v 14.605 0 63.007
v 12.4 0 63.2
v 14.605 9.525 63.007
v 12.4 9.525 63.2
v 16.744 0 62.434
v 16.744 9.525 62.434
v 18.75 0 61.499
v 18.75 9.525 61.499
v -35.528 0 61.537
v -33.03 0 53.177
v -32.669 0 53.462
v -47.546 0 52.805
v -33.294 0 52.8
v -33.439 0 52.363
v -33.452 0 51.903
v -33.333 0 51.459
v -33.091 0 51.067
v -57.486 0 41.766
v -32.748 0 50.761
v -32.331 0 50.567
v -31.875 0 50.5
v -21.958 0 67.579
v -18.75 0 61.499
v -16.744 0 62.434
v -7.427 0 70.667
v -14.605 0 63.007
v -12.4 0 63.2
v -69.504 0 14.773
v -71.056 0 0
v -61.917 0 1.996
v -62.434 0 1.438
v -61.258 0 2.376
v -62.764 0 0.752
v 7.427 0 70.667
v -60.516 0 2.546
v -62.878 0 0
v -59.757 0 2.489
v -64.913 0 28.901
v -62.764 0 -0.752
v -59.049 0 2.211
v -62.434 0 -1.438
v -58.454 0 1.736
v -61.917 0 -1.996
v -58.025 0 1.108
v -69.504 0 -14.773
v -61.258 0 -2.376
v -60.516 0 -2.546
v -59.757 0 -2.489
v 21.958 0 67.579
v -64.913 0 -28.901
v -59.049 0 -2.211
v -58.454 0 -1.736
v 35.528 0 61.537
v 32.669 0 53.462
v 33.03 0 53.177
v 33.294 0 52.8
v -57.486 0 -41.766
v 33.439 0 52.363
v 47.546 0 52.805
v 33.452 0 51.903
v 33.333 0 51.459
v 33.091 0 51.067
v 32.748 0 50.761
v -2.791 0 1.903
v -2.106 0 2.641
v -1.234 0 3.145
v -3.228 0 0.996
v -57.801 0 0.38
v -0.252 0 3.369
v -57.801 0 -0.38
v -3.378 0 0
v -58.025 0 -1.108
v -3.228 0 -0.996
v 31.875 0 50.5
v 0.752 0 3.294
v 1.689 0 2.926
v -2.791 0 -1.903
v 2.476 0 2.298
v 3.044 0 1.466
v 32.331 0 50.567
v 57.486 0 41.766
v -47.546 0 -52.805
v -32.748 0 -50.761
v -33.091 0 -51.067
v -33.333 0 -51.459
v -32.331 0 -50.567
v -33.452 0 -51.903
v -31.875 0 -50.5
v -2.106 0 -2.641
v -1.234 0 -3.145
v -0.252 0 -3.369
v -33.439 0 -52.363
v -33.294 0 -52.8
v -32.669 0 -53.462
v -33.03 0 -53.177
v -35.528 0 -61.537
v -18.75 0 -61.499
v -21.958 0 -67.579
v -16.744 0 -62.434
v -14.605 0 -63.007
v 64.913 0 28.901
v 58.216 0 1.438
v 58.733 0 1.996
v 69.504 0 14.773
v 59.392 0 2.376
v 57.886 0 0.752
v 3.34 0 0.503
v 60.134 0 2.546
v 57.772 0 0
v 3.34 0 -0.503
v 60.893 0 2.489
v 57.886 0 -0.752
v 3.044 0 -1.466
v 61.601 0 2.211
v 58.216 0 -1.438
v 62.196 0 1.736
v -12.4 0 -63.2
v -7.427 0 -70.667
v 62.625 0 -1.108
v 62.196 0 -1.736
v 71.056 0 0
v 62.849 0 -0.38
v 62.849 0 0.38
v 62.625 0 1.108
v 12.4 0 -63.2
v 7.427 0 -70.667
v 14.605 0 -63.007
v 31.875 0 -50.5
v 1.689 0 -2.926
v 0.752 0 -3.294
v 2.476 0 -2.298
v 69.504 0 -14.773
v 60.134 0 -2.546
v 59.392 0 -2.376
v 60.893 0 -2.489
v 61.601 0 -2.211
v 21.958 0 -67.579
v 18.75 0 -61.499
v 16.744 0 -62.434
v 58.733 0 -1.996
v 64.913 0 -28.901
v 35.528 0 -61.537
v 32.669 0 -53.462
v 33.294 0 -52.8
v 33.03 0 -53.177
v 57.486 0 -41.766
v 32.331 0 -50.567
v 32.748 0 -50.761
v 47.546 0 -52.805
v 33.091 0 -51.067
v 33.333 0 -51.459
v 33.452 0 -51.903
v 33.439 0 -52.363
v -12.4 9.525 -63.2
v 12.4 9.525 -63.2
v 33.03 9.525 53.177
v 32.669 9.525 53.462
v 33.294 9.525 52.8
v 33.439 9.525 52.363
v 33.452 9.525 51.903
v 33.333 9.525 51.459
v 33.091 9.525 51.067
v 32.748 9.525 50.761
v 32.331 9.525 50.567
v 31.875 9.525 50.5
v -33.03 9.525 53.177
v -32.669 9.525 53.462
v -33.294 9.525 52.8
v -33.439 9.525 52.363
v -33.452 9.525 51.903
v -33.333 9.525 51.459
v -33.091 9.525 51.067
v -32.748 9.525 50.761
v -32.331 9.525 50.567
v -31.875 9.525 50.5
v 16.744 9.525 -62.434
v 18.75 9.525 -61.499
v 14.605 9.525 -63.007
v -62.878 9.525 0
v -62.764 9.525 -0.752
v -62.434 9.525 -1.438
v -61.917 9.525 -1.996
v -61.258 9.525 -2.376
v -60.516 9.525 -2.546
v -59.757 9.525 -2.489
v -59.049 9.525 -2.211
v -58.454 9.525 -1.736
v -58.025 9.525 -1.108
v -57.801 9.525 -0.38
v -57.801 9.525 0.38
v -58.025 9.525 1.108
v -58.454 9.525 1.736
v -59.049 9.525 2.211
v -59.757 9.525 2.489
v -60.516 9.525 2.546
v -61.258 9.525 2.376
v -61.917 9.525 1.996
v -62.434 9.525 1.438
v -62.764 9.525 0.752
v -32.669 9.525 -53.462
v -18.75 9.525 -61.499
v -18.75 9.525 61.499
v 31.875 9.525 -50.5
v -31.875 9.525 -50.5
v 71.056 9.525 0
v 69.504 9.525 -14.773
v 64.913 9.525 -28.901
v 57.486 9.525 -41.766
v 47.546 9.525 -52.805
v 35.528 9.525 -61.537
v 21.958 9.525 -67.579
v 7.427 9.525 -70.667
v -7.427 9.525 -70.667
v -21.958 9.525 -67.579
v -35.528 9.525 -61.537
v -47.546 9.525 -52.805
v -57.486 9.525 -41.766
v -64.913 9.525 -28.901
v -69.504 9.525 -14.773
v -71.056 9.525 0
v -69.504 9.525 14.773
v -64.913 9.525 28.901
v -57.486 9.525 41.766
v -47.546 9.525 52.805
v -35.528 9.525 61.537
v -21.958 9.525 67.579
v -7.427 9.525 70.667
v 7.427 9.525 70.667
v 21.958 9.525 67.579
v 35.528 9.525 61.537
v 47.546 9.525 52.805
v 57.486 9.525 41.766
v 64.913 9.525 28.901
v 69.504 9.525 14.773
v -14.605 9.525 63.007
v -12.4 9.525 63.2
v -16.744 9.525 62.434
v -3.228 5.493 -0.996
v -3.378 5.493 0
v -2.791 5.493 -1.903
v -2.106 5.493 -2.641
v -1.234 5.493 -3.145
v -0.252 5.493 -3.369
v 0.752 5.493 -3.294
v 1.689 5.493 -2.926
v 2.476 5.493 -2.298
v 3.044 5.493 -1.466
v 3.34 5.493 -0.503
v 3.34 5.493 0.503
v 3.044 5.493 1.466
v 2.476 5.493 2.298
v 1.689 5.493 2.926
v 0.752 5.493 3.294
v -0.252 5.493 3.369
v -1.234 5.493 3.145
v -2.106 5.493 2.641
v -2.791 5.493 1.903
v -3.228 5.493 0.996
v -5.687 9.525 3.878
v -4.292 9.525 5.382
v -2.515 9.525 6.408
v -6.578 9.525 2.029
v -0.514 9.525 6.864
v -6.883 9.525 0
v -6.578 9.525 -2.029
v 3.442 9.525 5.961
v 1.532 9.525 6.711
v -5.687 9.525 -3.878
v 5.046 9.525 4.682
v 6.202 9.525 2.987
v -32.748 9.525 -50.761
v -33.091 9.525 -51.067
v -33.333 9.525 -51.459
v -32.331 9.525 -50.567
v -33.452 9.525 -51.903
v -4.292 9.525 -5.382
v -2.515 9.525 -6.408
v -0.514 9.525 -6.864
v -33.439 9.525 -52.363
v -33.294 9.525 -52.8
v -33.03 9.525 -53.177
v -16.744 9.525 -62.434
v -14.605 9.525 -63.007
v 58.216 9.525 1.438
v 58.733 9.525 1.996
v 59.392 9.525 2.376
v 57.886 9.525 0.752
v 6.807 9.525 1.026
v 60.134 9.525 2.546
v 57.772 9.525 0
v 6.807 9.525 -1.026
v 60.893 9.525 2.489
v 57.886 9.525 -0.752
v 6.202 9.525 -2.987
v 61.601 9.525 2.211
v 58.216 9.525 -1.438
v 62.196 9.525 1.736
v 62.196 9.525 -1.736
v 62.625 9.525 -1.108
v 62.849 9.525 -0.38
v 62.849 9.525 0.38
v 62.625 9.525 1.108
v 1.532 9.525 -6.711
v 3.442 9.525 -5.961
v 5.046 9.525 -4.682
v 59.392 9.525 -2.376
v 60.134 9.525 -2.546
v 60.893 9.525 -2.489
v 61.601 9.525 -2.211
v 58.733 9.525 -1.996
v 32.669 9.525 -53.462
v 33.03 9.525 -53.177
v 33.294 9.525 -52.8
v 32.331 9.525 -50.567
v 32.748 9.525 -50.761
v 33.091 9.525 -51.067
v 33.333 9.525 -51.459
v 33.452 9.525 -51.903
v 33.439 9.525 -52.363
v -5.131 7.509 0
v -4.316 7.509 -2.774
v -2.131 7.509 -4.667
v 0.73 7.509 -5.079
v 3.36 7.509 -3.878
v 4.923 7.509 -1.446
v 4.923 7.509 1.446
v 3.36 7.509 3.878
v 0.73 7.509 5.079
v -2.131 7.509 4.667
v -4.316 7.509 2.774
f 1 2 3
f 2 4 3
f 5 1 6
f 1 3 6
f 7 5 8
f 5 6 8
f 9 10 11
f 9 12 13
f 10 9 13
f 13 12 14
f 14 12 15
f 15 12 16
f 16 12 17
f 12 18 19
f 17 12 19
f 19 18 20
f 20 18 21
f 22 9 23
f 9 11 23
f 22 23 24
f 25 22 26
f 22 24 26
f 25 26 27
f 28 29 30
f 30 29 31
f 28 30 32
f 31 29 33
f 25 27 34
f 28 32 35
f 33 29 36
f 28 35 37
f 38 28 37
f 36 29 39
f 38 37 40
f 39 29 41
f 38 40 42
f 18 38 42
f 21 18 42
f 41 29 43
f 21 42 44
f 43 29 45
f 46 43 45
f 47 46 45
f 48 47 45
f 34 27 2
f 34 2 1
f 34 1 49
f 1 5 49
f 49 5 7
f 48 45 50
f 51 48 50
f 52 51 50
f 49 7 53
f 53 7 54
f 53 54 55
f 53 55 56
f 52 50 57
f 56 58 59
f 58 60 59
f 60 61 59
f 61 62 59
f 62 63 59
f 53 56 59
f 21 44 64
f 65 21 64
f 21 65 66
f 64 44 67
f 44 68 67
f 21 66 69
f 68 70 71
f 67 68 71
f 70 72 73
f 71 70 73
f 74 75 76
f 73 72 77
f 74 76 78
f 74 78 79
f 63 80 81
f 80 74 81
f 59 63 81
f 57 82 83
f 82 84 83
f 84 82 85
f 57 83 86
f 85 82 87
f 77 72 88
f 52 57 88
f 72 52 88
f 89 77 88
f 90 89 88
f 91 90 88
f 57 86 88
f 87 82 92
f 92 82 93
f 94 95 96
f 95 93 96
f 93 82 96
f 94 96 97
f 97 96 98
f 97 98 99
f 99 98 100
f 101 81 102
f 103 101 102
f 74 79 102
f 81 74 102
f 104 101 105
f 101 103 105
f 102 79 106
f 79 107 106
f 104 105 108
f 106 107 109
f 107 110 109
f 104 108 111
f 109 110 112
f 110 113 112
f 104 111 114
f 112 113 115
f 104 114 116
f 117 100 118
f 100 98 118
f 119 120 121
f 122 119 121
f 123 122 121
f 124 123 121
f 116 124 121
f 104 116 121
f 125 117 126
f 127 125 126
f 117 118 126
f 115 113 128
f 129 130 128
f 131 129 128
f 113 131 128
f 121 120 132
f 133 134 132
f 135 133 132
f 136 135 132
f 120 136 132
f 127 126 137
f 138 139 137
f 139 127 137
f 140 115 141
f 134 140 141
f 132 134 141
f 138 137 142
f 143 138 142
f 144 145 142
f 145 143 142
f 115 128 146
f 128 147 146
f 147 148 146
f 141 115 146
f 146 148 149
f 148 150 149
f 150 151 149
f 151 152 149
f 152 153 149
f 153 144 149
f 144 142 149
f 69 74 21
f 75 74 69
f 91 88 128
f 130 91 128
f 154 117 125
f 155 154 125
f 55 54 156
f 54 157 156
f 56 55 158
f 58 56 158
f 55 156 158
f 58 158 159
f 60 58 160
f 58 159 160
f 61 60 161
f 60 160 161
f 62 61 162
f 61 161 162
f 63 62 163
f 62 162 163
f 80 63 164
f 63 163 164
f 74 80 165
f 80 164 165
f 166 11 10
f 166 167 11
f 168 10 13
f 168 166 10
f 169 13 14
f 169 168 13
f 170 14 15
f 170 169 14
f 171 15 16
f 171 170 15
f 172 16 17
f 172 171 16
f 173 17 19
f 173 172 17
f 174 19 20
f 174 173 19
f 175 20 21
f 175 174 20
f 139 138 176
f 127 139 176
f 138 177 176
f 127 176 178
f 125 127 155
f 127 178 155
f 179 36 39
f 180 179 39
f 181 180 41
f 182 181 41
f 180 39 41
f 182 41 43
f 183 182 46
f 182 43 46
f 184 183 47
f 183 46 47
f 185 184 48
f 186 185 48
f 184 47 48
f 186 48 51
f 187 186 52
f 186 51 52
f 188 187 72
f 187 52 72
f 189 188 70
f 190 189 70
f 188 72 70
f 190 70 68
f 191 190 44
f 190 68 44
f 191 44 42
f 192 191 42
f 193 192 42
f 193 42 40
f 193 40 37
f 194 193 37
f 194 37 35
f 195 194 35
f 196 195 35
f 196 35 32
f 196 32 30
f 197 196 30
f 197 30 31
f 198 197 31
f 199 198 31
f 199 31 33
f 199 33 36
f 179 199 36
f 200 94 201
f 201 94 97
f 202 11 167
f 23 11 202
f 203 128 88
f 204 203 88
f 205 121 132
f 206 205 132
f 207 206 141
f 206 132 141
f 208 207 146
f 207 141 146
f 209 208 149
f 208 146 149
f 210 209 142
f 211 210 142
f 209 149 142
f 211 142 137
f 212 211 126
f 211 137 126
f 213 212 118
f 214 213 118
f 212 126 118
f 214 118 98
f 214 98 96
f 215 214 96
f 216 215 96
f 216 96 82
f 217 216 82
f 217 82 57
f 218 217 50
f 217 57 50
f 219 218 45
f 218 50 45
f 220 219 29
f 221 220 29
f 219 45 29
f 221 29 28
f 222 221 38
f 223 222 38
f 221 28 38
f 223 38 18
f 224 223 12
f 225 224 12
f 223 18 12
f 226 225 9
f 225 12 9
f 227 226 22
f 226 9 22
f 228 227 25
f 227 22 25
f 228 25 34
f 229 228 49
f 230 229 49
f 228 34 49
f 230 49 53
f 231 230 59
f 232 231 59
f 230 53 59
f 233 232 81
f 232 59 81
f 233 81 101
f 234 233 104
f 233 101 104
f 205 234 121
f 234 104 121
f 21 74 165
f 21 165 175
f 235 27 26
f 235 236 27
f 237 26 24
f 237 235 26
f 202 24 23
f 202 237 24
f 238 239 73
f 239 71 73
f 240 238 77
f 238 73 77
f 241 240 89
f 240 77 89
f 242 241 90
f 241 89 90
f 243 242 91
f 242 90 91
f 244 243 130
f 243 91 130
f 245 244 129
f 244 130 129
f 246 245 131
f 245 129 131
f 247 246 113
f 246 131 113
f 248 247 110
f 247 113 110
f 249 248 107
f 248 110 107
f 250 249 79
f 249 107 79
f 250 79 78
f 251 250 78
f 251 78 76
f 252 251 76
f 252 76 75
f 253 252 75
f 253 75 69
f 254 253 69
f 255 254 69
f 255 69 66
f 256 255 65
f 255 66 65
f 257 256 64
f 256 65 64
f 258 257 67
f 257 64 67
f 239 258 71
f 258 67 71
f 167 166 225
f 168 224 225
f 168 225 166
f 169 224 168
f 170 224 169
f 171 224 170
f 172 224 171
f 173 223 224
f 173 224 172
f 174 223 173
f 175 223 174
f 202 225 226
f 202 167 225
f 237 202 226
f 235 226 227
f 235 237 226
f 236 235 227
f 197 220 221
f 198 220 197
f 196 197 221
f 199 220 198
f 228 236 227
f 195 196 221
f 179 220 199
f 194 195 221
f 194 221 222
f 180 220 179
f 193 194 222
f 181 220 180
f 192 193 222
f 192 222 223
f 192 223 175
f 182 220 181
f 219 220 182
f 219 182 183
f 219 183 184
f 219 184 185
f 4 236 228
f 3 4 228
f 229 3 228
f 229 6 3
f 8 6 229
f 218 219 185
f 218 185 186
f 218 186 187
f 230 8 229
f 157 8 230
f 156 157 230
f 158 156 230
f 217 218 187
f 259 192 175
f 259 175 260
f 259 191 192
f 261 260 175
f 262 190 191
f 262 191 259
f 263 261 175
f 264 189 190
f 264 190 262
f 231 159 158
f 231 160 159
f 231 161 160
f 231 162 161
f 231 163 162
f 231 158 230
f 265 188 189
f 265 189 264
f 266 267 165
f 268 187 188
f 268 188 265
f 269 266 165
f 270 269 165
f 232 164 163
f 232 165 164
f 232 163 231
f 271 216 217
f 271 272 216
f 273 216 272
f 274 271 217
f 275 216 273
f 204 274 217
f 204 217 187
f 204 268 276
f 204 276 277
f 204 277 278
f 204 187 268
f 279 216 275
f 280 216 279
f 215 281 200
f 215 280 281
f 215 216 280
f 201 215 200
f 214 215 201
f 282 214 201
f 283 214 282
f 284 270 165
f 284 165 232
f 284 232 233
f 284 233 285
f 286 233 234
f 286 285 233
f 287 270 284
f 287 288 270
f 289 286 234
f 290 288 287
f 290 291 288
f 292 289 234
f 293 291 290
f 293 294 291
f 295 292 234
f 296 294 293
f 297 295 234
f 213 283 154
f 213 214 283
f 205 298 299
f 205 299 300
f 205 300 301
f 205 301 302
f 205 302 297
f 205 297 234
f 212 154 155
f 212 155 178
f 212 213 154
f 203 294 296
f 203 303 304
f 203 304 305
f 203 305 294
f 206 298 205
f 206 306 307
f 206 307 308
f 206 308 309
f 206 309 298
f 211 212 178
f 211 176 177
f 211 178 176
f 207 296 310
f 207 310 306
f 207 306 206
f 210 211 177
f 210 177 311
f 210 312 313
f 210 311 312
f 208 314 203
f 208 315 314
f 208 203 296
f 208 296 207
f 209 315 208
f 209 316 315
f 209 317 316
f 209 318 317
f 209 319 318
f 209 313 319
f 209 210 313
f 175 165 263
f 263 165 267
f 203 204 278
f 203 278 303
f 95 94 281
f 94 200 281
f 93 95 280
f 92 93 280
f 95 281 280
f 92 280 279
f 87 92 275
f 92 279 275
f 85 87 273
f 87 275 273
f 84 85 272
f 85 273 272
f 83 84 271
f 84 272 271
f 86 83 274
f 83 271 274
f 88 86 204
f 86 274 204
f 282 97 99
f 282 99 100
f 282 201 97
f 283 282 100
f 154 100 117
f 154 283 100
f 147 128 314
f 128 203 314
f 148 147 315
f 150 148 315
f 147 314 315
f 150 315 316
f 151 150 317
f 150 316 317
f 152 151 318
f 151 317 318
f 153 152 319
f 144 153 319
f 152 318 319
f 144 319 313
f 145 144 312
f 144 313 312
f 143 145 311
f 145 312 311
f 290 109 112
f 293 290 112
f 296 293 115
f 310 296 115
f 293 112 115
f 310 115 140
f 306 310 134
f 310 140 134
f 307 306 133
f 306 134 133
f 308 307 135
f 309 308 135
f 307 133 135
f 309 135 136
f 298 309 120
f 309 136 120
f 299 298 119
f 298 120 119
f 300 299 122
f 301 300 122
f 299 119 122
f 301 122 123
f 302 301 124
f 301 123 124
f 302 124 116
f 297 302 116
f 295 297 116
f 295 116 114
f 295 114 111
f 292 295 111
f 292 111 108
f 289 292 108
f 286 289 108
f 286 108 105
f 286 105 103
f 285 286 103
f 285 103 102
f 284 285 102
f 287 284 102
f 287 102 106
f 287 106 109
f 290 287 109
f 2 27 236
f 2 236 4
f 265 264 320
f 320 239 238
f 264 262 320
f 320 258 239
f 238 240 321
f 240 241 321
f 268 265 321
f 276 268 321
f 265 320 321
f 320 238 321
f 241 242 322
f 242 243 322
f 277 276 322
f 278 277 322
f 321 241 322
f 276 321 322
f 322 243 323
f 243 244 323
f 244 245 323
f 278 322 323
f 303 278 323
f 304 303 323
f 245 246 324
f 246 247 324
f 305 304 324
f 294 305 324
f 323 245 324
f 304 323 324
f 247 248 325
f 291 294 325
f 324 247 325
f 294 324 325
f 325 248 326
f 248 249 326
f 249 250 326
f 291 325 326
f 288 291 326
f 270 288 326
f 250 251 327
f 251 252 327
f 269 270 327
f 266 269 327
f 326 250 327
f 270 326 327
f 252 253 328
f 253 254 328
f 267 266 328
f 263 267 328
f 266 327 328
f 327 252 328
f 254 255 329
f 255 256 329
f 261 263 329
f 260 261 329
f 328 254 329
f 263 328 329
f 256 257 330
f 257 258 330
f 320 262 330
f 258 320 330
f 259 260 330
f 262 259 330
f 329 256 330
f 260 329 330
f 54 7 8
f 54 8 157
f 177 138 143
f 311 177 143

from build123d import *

# Parameters (mm, degrees)
SKETCH2_R                                        = 71.0565
BOSS_EXTRUDE1_DEPTH                              = 9.525
TAP_DRILL_FOR_1_4_20_TAP1_D                      = 5.1054
CSK_FOR_1_4_FLAT_HEAD_MACHINE_SCREW1_D           = 6.7564
CSK_FOR_1_4_FLAT_HEAD_MACHINE_SCREW1_CSINK_D     = 13.7668
CSK_FOR_1_4_FLAT_HEAD_MACHINE_SCREW1_CSINK_ANGLE = 82
CUT_EXTRUDE1_START                               = -10.525
CUT_EXTRUDE1_DEPTH                               = 11.525
FILLET1_R                                        = 12.7
FILLET2_R                                        = 1.5875
FILLET1_OF_MIRROR1_R                             = 12.7
FILLET2_OF_MIRROR1_R                             = 1.5875


with BuildPart() as part:
    # Sketch2 → Boss-Extrude1 (new body)
    with BuildSketch(Plane(origin=(0, 0, 0), x_dir=(1, 0, 0), z_dir=(0, 1, 0))):
        Circle(SKETCH2_R)
    extrude(amount=BOSS_EXTRUDE1_DEPTH)

    # Tap Drill for 1/4-20 Tap1 (through all)
    with Locations(Plane(origin=(0, 9.525, 0), x_dir=(1, 0, 0), z_dir=(0, 1, 0))):
        with Locations((-60.325, 0), (60.325, 0)):
            Hole(TAP_DRILL_FOR_1_4_20_TAP1_D / 2)

    # CSK for 1/4 Flat Head Machine Screw1 (through all)
    with Locations(Plane(origin=(0, 9.525, 0), x_dir=(1, 0, 0), z_dir=(0, 1, 0))):
        with Locations((0, 0)):
            CounterSinkHole(CSK_FOR_1_4_FLAT_HEAD_MACHINE_SCREW1_D / 2, CSK_FOR_1_4_FLAT_HEAD_MACHINE_SCREW1_CSINK_D / 2, counter_sink_angle=CSK_FOR_1_4_FLAT_HEAD_MACHINE_SCREW1_CSINK_ANGLE)

    # Sketch8 → Cut-Extrude1 (cut)
    with BuildSketch(Plane(origin=(0, 9.525, 0), x_dir=(1, 0, 0), z_dir=(0, 1, 0)).offset(CUT_EXTRUDE1_START)):
        Polygon((-37.8, 50.5), (-15.802954744, 63.2), (15.802954744, 63.2), (37.8, 50.5), align=None)
    cut_extrude1 = extrude(amount=CUT_EXTRUDE1_DEPTH, mode=Mode.SUBTRACT)

    # Fillet1
    fillet1_edges = [part.edges().sort_by_distance(p)[0] for p in [
        (-15.802954744, 4.7625, -63.2),
        (15.802954744, 4.7625, -63.2),
    ]]
    fillet(fillet1_edges, radius=FILLET1_R)

    # Fillet2
    fillet2_edges = [part.edges().sort_by_distance(p)[0] for p in [
        (37.8, 4.7625, -50.5),
        (-37.8, 4.7625, -50.5),
    ]]
    fillet(fillet2_edges, radius=FILLET2_R)

    # Mirror1: Cut-Extrude1 across plane
    add(cut_extrude1.mirror(Plane.XY), mode=Mode.SUBTRACT)

    # Fillet1 of Mirror1
    fillet1_of_mirror1_edges = [part.edges().sort_by_distance(p)[0] for p in [
        (-15.802954744, 4.7625, 63.2),
        (15.802954744, 4.7625, 63.2),
    ]]
    fillet(fillet1_of_mirror1_edges, radius=FILLET1_OF_MIRROR1_R)

    # Fillet2 of Mirror1
    fillet2_of_mirror1_edges = [part.edges().sort_by_distance(p)[0] for p in [
        (37.8, 4.7625, 50.5),
        (-37.8, 4.7625, 50.5),
    ]]
    fillet(fillet2_of_mirror1_edges, radius=FILLET2_OF_MIRROR1_R)


solid = part.part
